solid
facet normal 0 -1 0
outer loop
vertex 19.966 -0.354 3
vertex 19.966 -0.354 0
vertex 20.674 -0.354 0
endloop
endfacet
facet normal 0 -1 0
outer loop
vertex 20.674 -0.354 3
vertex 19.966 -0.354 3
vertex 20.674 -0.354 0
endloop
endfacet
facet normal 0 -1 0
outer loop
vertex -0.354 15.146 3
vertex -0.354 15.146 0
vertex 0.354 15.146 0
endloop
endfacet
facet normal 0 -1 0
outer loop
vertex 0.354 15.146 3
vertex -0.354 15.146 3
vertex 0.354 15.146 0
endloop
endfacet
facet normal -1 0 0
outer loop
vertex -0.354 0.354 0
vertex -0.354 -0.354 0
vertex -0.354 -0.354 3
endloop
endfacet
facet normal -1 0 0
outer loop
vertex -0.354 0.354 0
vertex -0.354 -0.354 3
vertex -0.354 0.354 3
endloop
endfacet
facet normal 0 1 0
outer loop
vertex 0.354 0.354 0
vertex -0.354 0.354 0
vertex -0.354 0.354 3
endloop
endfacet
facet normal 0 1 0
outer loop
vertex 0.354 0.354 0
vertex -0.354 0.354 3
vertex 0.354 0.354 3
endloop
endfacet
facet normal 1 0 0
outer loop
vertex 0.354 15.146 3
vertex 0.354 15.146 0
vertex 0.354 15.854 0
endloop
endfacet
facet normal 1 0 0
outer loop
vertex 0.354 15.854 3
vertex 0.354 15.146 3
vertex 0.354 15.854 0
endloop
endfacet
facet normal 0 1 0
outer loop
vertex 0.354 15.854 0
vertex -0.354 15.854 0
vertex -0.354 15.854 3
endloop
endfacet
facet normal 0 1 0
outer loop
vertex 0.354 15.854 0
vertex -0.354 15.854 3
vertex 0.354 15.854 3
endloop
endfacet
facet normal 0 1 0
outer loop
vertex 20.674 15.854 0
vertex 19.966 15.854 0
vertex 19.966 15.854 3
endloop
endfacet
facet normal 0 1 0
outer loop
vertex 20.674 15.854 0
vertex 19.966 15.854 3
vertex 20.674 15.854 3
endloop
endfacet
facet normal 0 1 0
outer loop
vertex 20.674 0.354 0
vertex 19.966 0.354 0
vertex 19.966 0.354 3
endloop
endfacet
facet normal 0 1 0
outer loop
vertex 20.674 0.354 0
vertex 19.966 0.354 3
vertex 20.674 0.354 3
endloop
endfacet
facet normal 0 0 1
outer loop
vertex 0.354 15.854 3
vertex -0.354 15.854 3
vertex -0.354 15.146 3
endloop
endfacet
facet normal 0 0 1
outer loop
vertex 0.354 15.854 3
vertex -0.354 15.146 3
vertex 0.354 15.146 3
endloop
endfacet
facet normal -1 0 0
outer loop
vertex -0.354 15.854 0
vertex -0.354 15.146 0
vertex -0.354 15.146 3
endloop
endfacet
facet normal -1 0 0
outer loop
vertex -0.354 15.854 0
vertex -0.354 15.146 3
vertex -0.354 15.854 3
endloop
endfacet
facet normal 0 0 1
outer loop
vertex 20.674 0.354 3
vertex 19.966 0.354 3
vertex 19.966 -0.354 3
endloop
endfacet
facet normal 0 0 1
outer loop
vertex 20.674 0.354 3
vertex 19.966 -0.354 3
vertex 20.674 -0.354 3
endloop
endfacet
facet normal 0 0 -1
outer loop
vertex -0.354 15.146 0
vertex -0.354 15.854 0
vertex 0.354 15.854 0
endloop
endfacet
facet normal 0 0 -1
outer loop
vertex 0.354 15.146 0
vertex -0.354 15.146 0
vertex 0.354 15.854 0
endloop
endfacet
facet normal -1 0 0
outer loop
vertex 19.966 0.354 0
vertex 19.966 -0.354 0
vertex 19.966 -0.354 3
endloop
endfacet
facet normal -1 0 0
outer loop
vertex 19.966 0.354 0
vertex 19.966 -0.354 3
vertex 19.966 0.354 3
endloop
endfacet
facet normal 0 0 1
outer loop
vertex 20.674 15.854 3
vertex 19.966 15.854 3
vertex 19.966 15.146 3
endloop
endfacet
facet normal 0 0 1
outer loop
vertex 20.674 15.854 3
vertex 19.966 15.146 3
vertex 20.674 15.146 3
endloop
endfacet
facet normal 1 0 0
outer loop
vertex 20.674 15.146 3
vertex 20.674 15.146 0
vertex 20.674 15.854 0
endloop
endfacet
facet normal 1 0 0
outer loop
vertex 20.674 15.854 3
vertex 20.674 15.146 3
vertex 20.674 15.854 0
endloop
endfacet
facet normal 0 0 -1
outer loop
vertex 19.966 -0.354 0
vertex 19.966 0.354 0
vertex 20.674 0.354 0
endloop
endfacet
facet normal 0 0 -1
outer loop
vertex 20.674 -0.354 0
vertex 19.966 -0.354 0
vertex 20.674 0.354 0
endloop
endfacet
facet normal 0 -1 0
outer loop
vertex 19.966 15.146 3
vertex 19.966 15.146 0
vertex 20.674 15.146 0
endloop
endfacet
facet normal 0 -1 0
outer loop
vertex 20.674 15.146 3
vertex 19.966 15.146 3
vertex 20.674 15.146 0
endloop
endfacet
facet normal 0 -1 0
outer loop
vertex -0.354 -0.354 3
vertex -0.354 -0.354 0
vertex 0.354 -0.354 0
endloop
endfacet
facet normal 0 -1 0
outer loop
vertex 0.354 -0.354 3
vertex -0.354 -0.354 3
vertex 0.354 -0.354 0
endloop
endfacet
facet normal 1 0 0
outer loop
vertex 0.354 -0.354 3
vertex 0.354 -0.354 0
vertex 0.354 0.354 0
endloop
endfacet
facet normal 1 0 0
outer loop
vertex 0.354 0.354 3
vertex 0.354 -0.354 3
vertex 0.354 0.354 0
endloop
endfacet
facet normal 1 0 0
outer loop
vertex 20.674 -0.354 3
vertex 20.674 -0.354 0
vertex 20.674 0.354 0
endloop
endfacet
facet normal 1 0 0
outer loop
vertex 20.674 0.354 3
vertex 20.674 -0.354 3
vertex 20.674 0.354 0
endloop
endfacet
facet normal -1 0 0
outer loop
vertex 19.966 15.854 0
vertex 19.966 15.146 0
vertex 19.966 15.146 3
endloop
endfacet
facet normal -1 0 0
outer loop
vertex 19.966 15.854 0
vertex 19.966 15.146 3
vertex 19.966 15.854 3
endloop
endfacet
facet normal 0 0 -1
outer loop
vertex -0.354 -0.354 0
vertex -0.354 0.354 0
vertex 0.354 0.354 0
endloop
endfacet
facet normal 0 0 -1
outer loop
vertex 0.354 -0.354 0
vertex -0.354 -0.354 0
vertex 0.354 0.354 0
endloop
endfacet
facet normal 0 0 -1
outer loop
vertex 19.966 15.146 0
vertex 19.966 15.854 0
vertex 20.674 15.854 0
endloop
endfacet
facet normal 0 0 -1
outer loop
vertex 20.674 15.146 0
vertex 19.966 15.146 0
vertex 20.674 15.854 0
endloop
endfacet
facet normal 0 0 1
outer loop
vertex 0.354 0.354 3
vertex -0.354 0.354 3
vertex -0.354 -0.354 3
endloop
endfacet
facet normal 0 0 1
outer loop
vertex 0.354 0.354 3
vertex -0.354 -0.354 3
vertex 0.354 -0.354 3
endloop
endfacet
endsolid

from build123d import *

# Parameters (mm, degrees)
SKETCH_1_W        = 0.707106782
SKETCH_1_H        = 0.707106782
EXTRUDE_1_DEPTH   = 3
EXTRUDE_1_2_DEPTH = 3
EXTRUDE_1_3_DEPTH = 3
EXTRUDE_1_4_DEPTH = 3


with BuildPart() as part:
    # 草图1 → 凸台-拉伸1 (new body)
    with BuildSketch(Plane.XY):
        with Locations((20.32, 0)):
            Rectangle(SKETCH_1_W, SKETCH_1_H)
    extrude(amount=EXTRUDE_1_DEPTH)


with BuildPart() as body_2:
    # 草图1 → Extrude 1 2 (new body)
    with BuildSketch(Plane.XY):
        Rectangle(SKETCH_1_W, SKETCH_1_H)
    extrude(amount=EXTRUDE_1_2_DEPTH)


with BuildPart() as body_3:
    # 草图1 → Extrude 1 3 (new body)
    with BuildSketch(Plane.XY):
        with Locations((20.32, 15.5)):
            Rectangle(SKETCH_1_W, SKETCH_1_H)
    extrude(amount=EXTRUDE_1_3_DEPTH)


with BuildPart() as body_4:
    # 草图1 → Extrude 1 4 (new body)
    with BuildSketch(Plane.XY):
        with Locations((0, 15.5)):
            Rectangle(SKETCH_1_W, SKETCH_1_H)
    extrude(amount=EXTRUDE_1_4_DEPTH)


solid = Compound([part.part, body_2.part, body_3.part, body_4.part])
